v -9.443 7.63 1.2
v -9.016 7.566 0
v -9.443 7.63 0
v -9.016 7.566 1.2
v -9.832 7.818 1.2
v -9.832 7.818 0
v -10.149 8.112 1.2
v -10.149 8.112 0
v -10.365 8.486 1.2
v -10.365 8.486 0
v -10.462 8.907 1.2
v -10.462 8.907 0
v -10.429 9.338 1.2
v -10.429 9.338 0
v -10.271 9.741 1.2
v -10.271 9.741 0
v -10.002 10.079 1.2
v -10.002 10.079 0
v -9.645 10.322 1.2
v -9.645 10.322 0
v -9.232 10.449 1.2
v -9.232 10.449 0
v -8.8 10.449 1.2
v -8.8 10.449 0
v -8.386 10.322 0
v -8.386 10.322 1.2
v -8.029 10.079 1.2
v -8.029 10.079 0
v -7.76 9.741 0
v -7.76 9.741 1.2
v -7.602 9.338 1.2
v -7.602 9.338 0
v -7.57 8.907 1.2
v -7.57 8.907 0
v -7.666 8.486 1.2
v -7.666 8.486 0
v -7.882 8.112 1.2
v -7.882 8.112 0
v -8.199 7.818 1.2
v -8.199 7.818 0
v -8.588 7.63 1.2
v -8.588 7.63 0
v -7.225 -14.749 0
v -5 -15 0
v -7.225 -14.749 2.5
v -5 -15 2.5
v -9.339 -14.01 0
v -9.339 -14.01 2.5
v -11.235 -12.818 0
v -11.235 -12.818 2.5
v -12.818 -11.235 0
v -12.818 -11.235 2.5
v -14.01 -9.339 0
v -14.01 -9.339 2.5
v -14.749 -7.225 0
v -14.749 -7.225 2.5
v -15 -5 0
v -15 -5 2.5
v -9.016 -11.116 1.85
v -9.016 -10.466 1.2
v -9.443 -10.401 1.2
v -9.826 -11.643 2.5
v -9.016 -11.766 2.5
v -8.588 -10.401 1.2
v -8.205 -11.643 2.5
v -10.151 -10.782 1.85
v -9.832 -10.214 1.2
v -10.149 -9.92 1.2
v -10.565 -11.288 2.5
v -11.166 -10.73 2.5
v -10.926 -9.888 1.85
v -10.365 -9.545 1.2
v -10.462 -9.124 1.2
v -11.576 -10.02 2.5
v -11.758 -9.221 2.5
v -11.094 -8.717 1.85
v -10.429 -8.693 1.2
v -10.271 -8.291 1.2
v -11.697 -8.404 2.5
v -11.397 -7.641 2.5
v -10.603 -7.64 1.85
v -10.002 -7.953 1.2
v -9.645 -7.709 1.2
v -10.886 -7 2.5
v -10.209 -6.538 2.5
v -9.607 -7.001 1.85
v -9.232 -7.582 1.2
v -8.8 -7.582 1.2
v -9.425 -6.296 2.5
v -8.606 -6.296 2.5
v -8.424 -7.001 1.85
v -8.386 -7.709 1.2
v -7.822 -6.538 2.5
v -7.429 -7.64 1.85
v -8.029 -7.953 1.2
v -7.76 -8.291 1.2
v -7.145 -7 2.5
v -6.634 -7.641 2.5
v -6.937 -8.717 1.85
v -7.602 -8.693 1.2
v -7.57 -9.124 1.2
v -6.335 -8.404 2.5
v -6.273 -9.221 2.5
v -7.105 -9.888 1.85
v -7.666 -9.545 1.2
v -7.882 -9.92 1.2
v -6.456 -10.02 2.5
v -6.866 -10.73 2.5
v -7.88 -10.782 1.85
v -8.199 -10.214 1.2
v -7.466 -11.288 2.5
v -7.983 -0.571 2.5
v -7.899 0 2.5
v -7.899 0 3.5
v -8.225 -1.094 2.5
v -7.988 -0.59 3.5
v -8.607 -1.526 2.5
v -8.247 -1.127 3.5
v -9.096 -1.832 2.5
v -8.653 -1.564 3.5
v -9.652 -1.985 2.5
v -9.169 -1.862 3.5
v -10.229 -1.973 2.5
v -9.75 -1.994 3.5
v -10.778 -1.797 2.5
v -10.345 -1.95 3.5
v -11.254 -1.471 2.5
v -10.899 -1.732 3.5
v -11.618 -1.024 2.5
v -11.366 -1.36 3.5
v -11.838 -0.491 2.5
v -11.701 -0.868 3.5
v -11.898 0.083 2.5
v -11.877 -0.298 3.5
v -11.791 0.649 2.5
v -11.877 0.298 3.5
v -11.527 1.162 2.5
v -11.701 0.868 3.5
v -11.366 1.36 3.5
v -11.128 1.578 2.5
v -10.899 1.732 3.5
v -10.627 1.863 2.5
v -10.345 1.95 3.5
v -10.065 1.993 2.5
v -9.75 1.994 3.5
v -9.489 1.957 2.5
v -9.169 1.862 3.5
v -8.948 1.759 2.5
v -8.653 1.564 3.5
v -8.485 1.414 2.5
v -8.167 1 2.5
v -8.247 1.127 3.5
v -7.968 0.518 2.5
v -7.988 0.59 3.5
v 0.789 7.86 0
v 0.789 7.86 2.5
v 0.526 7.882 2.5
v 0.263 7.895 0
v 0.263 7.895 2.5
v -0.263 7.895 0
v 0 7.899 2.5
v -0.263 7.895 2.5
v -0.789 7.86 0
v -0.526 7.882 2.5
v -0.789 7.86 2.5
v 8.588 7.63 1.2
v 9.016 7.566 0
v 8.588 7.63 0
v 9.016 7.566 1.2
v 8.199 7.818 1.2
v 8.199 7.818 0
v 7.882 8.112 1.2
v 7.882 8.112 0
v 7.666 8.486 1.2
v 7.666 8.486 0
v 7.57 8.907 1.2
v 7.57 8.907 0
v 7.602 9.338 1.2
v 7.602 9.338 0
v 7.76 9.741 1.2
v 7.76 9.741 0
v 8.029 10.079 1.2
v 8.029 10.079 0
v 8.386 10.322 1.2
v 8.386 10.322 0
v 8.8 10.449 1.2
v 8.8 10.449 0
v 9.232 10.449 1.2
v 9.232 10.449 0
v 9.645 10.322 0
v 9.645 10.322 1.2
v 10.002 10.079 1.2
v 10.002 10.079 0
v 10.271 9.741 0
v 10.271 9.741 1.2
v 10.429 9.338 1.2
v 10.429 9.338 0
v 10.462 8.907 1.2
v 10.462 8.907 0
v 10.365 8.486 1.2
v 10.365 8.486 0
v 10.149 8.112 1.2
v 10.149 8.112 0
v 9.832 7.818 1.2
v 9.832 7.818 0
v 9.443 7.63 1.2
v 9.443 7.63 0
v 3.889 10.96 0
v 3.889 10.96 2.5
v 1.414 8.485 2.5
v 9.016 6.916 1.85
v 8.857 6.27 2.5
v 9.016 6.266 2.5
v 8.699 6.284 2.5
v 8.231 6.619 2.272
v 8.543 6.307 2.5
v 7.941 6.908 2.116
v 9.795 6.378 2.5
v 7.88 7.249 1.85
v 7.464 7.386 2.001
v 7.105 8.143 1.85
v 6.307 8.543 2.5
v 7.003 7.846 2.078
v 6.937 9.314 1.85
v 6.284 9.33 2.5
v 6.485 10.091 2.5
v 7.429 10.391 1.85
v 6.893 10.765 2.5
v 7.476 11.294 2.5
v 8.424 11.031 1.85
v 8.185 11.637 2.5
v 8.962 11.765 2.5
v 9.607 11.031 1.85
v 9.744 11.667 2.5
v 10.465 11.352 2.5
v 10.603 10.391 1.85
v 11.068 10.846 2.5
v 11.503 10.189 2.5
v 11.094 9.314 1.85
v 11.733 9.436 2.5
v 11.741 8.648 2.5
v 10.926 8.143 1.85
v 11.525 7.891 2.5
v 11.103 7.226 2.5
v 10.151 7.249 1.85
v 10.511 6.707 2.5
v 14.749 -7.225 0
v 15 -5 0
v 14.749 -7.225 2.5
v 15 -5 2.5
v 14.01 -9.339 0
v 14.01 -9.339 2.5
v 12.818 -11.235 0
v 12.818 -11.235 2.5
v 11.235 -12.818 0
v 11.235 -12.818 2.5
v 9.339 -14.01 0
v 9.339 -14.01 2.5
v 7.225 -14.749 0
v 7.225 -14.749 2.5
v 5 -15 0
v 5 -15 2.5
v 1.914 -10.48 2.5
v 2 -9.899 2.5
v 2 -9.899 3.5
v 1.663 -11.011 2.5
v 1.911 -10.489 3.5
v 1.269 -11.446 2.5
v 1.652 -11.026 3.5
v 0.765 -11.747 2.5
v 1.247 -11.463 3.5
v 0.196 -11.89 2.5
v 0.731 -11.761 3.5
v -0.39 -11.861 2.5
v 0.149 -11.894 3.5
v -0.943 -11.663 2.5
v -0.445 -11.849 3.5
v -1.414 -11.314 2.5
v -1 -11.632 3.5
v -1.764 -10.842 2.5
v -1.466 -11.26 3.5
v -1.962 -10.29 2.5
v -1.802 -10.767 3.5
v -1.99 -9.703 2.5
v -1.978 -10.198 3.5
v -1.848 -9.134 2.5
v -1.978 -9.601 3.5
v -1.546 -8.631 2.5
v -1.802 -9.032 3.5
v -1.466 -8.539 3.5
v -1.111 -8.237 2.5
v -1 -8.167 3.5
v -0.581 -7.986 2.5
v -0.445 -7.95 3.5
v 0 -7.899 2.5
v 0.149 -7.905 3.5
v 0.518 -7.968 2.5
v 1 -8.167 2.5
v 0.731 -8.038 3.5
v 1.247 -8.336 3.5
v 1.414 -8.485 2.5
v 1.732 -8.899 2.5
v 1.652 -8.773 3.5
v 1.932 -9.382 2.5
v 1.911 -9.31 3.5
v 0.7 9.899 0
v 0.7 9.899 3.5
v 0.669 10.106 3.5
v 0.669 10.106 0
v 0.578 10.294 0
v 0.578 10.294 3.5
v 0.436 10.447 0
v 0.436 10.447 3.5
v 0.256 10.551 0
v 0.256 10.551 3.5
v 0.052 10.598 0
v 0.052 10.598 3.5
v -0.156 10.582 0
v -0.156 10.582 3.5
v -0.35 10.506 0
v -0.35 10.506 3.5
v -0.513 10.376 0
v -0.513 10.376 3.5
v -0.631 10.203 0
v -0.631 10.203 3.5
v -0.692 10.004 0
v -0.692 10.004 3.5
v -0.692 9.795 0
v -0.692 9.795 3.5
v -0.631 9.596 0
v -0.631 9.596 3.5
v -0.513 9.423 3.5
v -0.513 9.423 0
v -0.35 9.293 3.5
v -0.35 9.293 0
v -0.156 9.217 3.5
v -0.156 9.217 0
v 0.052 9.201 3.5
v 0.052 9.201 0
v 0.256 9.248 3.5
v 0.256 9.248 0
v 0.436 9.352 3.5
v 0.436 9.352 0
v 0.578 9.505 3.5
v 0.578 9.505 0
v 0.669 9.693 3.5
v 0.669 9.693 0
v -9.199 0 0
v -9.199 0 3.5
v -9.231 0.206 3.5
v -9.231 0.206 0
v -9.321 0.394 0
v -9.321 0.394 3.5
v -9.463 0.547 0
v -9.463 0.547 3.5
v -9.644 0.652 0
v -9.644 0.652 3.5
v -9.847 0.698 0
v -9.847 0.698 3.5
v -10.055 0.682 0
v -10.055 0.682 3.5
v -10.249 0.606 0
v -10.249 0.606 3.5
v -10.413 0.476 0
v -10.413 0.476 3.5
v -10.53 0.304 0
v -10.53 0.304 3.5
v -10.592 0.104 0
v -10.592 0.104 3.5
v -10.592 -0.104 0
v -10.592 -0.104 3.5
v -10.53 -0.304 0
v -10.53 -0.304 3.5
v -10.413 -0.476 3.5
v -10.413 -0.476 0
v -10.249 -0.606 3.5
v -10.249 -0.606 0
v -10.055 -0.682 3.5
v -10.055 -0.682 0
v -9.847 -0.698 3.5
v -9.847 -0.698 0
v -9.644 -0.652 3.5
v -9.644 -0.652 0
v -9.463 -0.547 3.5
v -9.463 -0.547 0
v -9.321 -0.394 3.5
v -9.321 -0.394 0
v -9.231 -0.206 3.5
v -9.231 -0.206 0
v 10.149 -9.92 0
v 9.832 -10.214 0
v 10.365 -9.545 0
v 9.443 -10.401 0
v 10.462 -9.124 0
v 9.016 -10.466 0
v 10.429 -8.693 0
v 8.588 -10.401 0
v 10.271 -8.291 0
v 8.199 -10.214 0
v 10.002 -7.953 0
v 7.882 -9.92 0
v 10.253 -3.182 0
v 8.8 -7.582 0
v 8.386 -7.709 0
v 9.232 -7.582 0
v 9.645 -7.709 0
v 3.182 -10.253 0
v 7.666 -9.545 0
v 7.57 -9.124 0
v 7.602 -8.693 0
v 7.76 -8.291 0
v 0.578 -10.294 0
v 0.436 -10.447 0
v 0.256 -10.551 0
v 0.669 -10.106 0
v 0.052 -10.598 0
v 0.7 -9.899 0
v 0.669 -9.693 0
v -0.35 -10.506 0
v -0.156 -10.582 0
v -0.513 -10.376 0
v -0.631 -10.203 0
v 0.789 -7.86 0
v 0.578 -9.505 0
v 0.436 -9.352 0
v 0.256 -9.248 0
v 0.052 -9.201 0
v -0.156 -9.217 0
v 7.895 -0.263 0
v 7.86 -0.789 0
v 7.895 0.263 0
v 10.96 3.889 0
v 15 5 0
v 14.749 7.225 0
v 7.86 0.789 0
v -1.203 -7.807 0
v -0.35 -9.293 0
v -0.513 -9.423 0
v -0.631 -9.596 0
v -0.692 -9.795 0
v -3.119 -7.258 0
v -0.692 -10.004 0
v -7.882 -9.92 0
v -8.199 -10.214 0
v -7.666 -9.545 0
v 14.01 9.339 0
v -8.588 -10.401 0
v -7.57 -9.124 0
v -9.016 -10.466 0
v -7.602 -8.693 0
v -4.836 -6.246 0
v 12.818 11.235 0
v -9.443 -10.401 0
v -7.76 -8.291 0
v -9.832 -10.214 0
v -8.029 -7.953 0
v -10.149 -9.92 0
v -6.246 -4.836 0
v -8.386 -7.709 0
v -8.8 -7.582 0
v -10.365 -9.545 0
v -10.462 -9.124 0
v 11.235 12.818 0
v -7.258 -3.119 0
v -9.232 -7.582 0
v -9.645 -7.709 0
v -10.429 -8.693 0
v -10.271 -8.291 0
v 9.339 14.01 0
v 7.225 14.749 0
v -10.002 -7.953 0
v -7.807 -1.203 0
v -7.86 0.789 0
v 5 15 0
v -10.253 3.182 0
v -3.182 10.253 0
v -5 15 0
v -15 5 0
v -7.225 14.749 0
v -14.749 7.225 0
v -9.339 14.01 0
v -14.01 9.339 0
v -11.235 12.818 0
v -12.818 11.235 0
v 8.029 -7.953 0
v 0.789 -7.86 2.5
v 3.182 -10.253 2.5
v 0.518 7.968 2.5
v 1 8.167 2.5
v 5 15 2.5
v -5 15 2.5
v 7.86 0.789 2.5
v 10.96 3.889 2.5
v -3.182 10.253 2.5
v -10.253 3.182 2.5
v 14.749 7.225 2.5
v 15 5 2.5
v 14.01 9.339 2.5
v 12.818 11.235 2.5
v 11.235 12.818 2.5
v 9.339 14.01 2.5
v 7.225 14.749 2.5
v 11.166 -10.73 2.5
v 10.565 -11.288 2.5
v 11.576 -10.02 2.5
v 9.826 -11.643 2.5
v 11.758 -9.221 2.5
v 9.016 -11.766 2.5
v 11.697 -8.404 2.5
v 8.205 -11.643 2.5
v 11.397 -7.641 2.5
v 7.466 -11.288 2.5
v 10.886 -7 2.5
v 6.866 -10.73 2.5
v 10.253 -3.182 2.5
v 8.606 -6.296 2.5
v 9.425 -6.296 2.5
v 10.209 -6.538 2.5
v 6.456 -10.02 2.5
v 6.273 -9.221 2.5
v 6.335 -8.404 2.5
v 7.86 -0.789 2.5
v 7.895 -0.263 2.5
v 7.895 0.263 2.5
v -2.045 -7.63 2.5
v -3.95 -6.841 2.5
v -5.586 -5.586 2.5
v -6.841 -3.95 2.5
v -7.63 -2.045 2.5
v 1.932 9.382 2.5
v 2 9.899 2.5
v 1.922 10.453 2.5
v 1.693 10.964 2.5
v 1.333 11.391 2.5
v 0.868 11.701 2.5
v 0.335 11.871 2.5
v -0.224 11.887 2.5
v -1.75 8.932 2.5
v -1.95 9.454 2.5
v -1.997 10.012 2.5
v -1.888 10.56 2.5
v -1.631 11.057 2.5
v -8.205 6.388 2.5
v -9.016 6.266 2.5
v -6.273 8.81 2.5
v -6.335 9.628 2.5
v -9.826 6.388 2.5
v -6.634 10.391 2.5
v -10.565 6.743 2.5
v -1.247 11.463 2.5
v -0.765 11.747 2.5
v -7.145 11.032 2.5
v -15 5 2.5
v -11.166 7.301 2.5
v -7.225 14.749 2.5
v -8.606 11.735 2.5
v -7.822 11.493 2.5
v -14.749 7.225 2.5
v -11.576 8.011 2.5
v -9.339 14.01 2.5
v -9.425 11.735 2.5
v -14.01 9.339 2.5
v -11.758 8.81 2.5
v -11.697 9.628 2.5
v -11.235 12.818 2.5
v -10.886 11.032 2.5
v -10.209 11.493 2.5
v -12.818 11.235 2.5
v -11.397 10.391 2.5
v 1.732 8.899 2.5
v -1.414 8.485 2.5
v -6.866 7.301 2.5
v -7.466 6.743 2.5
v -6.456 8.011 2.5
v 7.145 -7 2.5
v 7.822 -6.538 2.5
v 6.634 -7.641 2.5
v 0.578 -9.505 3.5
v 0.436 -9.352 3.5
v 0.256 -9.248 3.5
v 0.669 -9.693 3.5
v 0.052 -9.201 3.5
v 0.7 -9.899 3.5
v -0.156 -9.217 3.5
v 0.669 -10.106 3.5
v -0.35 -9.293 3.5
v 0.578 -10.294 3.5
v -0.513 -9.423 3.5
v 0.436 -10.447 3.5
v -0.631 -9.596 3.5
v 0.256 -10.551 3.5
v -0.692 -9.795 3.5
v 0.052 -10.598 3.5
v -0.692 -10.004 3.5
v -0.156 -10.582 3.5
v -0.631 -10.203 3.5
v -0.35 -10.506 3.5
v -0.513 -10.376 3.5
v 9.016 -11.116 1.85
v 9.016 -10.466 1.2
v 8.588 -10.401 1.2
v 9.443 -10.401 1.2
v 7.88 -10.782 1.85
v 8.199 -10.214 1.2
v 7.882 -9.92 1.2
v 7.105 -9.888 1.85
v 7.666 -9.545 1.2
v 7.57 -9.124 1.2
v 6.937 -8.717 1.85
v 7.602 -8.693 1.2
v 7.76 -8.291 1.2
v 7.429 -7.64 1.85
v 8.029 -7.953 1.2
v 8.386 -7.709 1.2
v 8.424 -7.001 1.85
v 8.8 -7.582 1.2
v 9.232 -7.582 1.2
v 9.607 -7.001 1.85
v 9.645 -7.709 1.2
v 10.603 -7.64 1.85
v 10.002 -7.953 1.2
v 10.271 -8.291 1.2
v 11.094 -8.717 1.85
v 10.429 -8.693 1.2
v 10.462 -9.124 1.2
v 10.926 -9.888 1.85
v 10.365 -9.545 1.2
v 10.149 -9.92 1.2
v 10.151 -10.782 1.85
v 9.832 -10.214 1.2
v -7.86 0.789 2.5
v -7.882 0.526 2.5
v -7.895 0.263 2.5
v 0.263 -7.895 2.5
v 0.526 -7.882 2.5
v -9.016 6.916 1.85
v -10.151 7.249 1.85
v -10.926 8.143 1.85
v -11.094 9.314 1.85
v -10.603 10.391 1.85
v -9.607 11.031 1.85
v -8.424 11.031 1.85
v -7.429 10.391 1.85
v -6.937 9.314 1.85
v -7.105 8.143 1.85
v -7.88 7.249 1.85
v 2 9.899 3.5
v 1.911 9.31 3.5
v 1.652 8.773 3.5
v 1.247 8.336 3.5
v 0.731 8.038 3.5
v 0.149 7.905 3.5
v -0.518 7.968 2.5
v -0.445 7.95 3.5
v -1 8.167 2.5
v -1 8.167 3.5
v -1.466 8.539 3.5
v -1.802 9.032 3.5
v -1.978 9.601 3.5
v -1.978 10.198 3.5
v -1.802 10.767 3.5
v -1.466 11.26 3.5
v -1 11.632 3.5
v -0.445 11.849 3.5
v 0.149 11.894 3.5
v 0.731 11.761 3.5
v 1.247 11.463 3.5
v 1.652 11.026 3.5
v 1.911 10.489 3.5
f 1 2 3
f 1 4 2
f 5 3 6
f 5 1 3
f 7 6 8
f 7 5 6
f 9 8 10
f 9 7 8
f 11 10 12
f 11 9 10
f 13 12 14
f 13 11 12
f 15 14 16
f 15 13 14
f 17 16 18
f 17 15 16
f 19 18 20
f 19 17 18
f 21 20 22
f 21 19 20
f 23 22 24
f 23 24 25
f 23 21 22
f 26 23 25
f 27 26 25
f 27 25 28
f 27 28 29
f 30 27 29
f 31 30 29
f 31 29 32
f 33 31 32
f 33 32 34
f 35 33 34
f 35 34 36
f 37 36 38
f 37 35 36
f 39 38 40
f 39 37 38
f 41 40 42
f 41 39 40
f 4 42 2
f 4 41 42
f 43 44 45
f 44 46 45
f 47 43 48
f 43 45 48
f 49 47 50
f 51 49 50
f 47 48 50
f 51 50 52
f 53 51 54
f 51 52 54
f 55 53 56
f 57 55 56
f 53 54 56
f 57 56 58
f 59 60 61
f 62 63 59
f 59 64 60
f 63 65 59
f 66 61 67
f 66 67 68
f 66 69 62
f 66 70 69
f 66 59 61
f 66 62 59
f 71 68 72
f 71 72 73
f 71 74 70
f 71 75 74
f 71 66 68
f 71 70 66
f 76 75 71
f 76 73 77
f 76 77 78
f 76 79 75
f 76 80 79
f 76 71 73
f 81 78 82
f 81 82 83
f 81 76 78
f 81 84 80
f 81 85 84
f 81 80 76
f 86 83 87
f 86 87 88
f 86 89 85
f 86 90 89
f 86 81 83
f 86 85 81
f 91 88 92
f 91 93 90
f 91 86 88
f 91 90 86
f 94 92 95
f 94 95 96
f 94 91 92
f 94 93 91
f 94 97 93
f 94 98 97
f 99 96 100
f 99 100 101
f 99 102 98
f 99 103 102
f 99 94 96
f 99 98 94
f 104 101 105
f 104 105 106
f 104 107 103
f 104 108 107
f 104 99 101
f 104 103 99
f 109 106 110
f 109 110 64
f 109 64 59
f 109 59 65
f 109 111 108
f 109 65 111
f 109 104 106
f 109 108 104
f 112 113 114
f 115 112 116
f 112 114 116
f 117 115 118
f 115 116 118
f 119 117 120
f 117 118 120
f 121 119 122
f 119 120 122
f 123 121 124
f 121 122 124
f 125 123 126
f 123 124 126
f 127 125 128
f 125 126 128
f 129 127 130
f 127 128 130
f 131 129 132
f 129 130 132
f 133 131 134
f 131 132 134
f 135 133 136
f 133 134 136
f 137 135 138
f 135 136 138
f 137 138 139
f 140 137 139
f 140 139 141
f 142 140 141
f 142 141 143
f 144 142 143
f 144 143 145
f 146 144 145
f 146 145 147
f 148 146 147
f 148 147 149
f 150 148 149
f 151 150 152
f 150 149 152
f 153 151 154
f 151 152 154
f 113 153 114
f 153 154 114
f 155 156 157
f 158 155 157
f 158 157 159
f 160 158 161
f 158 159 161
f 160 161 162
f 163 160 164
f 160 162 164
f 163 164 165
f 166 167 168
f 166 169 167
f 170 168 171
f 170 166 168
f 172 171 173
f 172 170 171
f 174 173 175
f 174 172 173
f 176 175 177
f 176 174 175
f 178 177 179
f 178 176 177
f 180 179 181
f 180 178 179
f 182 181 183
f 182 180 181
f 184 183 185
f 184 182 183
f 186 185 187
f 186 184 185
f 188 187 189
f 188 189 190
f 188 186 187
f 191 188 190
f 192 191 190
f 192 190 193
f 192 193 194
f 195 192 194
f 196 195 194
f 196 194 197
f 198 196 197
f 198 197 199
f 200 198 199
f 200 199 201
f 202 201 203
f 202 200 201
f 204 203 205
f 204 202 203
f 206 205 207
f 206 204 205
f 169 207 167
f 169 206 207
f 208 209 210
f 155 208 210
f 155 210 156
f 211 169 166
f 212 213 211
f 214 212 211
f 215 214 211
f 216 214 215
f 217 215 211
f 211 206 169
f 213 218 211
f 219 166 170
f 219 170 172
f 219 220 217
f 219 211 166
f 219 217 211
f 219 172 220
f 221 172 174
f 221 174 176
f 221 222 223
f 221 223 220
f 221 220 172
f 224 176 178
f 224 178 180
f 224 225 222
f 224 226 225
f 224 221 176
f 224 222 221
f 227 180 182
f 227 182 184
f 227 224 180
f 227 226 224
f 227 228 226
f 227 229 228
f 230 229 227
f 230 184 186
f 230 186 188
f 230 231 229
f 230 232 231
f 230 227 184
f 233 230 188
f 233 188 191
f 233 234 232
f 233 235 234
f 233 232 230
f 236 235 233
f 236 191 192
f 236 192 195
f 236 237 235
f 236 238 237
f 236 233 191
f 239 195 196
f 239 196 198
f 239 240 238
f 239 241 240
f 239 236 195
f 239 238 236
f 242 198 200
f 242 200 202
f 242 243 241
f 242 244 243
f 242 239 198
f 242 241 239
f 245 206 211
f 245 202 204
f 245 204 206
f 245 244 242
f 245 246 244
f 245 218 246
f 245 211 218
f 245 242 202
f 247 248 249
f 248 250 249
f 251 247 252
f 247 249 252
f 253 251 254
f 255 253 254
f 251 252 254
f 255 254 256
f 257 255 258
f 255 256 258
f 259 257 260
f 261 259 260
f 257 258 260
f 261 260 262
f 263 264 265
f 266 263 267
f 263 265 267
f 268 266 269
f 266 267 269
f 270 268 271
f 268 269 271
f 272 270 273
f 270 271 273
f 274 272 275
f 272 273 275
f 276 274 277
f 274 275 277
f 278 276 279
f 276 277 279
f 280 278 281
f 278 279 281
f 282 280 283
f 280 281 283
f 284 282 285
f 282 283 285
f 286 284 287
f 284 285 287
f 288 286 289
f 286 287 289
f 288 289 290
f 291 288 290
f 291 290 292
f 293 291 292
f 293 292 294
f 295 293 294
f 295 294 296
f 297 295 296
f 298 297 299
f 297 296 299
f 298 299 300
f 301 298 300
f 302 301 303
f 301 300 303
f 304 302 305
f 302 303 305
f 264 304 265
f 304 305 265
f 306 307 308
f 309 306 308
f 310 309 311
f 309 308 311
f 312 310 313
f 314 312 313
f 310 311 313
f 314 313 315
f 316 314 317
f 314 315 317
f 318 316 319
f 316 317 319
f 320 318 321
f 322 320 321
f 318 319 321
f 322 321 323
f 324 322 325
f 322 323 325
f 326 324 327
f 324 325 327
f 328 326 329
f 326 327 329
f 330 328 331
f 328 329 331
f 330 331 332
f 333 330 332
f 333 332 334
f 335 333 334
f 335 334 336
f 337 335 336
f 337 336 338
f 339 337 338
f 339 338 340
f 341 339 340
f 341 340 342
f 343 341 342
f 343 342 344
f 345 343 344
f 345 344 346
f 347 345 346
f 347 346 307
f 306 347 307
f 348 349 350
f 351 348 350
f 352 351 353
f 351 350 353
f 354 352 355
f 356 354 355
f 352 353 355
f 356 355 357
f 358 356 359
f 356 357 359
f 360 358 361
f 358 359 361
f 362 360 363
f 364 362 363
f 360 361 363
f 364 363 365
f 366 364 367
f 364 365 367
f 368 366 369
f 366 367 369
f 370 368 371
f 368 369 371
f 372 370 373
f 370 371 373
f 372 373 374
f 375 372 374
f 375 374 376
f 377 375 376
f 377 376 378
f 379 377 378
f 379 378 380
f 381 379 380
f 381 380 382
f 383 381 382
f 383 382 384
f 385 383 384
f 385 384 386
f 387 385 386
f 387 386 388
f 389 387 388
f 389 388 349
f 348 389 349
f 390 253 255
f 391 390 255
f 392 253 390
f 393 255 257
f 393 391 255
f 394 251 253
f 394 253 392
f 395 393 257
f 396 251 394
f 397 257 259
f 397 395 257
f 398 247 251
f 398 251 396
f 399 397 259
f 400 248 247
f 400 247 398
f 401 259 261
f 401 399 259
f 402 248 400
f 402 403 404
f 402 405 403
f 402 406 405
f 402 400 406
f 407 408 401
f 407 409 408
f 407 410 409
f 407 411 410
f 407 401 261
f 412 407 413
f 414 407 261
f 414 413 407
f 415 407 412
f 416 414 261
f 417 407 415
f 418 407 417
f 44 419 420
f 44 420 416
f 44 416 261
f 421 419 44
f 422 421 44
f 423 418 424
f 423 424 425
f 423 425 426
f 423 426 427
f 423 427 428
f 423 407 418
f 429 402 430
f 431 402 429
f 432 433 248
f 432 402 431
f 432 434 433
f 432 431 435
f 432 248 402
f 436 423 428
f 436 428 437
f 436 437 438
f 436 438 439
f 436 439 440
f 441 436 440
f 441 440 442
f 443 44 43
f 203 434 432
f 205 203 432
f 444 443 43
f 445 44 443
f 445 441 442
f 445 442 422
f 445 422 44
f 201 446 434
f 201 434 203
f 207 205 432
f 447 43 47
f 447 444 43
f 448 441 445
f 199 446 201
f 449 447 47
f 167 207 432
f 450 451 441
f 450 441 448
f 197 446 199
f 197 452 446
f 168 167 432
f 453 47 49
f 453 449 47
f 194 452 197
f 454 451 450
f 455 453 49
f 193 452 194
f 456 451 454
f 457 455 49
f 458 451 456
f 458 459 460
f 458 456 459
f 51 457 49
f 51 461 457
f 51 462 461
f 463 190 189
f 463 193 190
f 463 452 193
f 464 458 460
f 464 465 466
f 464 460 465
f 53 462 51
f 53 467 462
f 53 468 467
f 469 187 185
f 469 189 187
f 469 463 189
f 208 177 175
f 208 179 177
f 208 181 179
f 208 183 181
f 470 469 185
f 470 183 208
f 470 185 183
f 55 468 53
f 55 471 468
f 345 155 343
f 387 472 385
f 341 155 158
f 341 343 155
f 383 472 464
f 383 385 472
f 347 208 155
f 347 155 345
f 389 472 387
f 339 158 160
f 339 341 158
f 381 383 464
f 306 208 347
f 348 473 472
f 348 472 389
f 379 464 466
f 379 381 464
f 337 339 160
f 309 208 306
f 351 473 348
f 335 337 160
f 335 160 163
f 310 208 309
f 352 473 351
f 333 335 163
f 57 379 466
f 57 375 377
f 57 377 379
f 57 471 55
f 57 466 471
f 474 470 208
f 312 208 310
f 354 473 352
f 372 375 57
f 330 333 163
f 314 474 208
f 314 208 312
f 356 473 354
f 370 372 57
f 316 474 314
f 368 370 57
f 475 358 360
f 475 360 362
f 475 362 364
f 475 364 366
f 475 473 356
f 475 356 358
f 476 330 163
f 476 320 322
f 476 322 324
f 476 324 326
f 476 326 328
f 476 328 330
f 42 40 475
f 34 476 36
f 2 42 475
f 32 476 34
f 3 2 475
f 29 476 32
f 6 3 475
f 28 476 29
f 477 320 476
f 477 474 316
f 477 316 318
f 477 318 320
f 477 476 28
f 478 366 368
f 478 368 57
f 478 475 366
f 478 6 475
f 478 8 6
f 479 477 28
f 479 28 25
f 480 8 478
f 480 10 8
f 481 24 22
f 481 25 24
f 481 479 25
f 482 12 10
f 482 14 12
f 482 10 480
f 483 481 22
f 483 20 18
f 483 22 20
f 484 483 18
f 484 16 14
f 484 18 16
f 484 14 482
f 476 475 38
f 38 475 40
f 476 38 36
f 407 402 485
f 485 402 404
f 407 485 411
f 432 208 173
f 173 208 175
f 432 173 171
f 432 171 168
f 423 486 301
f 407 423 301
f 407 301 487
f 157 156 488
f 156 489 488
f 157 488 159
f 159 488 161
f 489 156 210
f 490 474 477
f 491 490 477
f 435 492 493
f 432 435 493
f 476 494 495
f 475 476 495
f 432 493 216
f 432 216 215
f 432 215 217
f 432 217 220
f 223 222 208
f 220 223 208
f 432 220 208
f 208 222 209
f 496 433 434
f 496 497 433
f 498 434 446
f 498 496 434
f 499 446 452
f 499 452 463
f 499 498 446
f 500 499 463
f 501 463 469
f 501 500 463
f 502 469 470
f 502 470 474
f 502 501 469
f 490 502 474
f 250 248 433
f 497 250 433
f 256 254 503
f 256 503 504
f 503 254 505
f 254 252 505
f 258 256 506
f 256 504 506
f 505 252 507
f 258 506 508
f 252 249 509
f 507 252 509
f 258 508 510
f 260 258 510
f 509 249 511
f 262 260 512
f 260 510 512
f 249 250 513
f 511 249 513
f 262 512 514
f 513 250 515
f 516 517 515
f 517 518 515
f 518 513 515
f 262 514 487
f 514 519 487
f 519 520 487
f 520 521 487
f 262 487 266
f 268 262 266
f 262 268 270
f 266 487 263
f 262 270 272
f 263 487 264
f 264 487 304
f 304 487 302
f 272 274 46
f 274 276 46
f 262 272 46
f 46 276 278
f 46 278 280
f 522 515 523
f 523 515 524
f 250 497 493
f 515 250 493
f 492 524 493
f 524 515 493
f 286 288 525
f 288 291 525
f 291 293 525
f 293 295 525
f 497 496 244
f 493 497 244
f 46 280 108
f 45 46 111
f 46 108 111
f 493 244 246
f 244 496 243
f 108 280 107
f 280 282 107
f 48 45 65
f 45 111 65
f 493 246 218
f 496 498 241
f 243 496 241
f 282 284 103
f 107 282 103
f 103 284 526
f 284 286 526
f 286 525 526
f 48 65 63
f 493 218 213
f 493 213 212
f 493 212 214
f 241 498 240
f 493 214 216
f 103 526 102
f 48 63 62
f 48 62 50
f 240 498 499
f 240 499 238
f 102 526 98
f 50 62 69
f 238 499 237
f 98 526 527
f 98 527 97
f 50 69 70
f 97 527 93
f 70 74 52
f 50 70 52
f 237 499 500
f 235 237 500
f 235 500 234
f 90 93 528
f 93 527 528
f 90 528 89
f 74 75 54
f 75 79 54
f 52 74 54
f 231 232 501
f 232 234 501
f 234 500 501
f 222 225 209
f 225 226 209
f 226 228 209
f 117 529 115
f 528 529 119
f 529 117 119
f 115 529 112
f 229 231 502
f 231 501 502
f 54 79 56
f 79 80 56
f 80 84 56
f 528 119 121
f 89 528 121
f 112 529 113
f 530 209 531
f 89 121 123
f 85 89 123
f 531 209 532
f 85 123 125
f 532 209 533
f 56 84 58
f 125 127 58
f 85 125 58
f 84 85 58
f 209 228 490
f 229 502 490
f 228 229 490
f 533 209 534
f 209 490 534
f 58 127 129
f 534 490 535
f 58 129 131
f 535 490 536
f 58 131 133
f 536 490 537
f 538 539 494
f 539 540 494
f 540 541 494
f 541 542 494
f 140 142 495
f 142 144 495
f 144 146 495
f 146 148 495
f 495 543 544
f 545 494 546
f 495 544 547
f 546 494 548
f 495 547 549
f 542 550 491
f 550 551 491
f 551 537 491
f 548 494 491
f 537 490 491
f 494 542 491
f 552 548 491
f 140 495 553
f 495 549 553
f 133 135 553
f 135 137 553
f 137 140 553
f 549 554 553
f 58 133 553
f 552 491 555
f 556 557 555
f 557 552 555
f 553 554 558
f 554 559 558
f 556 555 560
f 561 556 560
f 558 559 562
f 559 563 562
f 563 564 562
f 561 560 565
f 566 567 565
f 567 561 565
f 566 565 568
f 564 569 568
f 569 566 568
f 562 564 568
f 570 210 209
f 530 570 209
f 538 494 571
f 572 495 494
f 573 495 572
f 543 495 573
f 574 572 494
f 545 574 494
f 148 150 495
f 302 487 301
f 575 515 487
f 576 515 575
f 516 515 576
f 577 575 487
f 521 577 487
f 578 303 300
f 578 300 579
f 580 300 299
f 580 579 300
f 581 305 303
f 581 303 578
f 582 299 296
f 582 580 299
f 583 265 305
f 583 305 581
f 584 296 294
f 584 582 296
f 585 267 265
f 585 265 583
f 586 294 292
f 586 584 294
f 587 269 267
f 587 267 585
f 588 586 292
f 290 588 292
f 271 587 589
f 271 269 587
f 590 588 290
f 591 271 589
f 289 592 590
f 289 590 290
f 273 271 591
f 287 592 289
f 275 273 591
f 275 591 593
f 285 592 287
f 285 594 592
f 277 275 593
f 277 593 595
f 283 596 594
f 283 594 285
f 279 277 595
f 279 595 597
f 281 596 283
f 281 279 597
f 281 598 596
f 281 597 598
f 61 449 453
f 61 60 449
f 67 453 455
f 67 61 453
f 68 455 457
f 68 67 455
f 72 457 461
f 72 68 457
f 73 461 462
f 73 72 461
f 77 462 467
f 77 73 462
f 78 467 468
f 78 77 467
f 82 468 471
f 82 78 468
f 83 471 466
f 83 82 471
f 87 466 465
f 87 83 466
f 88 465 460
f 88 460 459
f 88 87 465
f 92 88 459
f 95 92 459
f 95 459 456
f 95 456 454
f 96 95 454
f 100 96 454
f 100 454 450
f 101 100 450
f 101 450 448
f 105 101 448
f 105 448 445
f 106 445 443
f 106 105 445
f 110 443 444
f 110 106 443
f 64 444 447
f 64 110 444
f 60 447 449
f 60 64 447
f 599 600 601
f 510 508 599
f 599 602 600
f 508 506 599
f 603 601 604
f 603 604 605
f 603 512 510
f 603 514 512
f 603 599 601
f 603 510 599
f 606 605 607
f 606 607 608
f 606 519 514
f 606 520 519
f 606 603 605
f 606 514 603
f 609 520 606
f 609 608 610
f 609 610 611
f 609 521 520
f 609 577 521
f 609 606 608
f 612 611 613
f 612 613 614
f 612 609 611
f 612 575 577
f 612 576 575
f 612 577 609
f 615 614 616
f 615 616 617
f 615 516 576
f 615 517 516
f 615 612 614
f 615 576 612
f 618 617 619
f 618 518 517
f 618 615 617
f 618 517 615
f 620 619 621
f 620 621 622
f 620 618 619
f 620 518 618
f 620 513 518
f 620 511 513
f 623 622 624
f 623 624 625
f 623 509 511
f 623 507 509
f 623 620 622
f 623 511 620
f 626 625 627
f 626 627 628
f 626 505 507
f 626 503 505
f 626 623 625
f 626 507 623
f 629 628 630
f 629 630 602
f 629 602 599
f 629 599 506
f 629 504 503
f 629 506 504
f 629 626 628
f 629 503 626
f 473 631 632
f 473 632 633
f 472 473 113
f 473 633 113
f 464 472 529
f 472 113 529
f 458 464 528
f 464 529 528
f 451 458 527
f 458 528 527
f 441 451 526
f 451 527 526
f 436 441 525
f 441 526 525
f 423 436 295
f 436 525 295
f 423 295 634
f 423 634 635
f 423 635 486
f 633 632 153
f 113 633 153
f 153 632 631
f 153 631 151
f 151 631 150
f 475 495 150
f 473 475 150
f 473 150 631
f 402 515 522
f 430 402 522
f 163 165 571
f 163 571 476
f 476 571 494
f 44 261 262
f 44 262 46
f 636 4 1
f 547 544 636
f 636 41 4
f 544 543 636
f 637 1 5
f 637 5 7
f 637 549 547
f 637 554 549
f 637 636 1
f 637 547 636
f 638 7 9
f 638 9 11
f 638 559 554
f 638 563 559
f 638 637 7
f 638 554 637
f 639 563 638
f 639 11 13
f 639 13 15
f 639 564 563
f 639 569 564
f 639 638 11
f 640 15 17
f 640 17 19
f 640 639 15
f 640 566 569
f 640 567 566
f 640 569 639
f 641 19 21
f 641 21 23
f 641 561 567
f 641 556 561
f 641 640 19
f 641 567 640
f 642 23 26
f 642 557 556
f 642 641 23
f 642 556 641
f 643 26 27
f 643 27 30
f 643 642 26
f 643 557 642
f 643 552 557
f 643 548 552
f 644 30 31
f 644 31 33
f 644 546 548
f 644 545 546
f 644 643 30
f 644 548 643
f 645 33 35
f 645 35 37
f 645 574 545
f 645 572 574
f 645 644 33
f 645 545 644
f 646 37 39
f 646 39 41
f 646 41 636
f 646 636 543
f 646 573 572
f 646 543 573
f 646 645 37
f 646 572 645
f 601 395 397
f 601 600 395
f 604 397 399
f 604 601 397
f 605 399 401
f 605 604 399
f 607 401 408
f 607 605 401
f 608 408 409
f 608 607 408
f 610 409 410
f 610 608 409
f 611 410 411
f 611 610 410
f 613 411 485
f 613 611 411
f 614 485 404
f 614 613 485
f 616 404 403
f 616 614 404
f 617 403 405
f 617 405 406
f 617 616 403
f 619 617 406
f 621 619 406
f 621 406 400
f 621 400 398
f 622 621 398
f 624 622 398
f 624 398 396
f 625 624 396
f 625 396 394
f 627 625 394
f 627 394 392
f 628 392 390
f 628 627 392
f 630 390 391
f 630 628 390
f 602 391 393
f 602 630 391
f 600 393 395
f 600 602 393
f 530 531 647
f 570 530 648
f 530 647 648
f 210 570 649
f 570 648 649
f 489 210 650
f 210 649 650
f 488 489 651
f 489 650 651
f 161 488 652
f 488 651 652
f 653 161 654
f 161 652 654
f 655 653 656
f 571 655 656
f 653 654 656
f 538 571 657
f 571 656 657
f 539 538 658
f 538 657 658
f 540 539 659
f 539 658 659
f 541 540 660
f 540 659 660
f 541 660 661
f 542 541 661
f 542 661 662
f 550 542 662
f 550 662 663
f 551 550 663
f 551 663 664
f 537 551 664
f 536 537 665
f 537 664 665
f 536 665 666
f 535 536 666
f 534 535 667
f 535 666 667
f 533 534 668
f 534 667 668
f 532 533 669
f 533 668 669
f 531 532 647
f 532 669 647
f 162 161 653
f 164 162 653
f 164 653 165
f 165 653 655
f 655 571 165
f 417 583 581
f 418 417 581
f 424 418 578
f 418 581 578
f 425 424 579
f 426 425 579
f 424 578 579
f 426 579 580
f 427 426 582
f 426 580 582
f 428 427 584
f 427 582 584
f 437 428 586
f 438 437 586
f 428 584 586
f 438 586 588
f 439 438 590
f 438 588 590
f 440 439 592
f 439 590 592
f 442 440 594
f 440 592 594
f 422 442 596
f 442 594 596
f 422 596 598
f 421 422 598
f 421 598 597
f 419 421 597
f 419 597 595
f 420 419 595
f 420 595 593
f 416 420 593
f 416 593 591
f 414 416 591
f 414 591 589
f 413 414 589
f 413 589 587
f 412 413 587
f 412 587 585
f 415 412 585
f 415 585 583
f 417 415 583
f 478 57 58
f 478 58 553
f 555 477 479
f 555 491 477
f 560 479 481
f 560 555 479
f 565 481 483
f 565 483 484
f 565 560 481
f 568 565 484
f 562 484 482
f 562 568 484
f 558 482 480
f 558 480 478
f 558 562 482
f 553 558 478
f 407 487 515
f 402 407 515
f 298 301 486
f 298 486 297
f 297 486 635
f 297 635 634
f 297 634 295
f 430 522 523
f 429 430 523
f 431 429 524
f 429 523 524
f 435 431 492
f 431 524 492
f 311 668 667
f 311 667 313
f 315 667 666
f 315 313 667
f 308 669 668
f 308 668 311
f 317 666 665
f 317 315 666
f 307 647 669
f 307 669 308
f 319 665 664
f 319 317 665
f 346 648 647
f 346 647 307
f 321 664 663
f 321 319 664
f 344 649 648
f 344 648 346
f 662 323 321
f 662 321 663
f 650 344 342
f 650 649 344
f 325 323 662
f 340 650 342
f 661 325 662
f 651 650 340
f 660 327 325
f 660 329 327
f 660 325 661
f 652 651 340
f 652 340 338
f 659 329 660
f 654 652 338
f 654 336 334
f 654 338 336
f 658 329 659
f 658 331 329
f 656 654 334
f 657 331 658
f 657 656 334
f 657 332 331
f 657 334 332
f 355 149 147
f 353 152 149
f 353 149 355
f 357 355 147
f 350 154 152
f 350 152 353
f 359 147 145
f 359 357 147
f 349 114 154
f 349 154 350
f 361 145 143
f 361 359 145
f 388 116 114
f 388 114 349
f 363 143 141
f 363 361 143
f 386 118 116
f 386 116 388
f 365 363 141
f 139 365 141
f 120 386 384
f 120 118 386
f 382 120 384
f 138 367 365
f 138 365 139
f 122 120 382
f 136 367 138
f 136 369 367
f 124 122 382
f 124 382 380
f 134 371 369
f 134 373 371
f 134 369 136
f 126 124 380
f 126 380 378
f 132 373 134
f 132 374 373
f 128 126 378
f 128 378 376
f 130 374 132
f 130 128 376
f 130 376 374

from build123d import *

# Parameters (mm, degrees)
SKETCH1_W                                      = 30
SKETCH1_H                                      = 30
BOSS_EXTRUDE1_DEPTH                            = 2.5
CUT_EXTRUDE1_DEPTH                             = 3.5
SKETCH3_W                                      = 2
SKETCH3_H                                      = 1
SKETCH4_W                                      = 2
SKETCH4_H                                      = 1
SKETCH5_W                                      = 2
SKETCH5_H                                      = 1
CSK_FOR_M2_5_FLAT_HEAD_MACHINE_SCREW1_AT_COUNT = 2
CSK_FOR_M2_5_FLAT_HEAD_MACHINE_SCREW1_AT_PITCH = 18.03122292
CSK_FOR_M2_5_FLAT_HEAD_MACHINE_SCREW_2_COUNT   = 2
CSK_FOR_M2_5_FLAT_HEAD_MACHINE_SCREW_2_PITCH   = 25.5
CSK_FOR_M2_5_FLAT_HEAD_MACHINE_SCREW_3_COUNT   = 2
CSK_FOR_M2_5_FLAT_HEAD_MACHINE_SCREW_3_PITCH   = 18.03122292
F_1_4_1_4_DIAMETER_HOLE1_D                     = 1.4
F_1_4_1_4_DIAMETER_HOLE1_DEPTH                 = 3.5
FILLET1_R                                      = 10


with BuildPart() as part:
    # Sketch1 → Boss-Extrude1 (new body)
    with BuildSketch(Plane(origin=(0, 0, 0), x_dir=(-1, 0, 0), z_dir=(0, 0, -1))):
        Rectangle(SKETCH1_W, SKETCH1_H)
    extrude(amount=-BOSS_EXTRUDE1_DEPTH)

    # Sketch2 → Cut-Extrude1 (cut, through all)
    with BuildSketch(Plane.XY.offset(2.5)):
        with BuildLine():
            Line((-3.181980515, 10.253048327), (-10.253048327, 3.181980515))
            Line((-10.253048327, 3.181980515), (-7.860000362, 0.78893255))
            ThreePointArc((-7.860000362, 0.78893255), (-5.585786438, -5.585786438), (0.78893255, -7.860000362))
            Line((0.78893255, -7.860000362), (3.181980515, -10.253048327))
            Line((3.181980515, -10.253048327), (10.253048327, -3.181980515))
            Line((10.253048327, -3.181980515), (7.860000362, -0.78893255))
            ThreePointArc((7.860000362, -0.78893255), (7.899494937, 0), (7.860000362, 0.78893255))
            Line((7.860000362, 0.78893255), (10.960155108, 3.889087297))
            Line((10.960155108, 3.889087297), (3.889087297, 10.960155108))
            Line((3.889087297, 10.960155108), (0.78893255, 7.860000362))
            ThreePointArc((0.78893255, 7.860000362), (0, 7.899494937), (-0.78893255, 7.860000362))
            Line((-0.78893255, 7.860000362), (-3.181980515, 10.253048327))
        make_face()
    extrude(amount=-CUT_EXTRUDE1_DEPTH, mode=Mode.SUBTRACT)

    # Sketch3 → Revolve1 (revolve)
    with BuildSketch(Plane.XZ):
        with Locations((-8.899494937, 3)):
            Rectangle(SKETCH3_W, SKETCH3_H)
    revolve(axis=Axis((-9.899494937, 0, 3.5), (0, 0, -1)))

    # Sketch4 → Revolve2 (revolve)
    with BuildSketch(Plane.XZ.offset(-9.899494937)):
        with Locations((1, 3)):
            Rectangle(SKETCH4_W, SKETCH4_H)
    revolve(axis=Axis((0, 9.899494937, 3.5), (0, 0, -1)))

    # Sketch5 → Revolve3 (revolve)
    with BuildSketch(Plane.XZ.offset(9.899494937)):
        with Locations((1, 3)):
            Rectangle(SKETCH5_W, SKETCH5_H)
    revolve(axis=Axis((0, -9.899494937, 3.5), (0, 0, -1)))

    # Sketch6 → CSK for M2.5 Flat Head Machine Screw1 (revolve, cut)
    with BuildSketch(Plane(origin=(9.01561146, 9.01561146, 2.5), x_dir=(0, -1, 0), z_dir=(1, 0, 0))):
        Polygon((0, 0), (0, 2.5), (1.45, 2.5), (1.45, 1.3), (2.75, 0), align=None)
    csk_for_m2_5_flat_head_machine_screw1 = revolve(axis=Axis((9.01561146, 9.01561146, 8.85), (0, 0, -1)), mode=Mode.SUBTRACT)

    # CSK for M2.5 Flat Head Machine Screw1 at: CSK for M2.5 Flat Head Machine Screw1 ×2
    with Locations(*[(-i * CSK_FOR_M2_5_FLAT_HEAD_MACHINE_SCREW1_AT_PITCH, 0, 0) for i in range(1, CSK_FOR_M2_5_FLAT_HEAD_MACHINE_SCREW1_AT_COUNT)]):
        add(csk_for_m2_5_flat_head_machine_screw1, mode=Mode.SUBTRACT)

    # CSK for M2.5 Flat Head Machine Screw 2: CSK for M2.5 Flat Head Machine Screw1 ×2
    with Locations(*[Vector(-0.707106781, -0.707106781, 0) * (i * CSK_FOR_M2_5_FLAT_HEAD_MACHINE_SCREW_2_PITCH) for i in range(1, CSK_FOR_M2_5_FLAT_HEAD_MACHINE_SCREW_2_COUNT)]):
        add(csk_for_m2_5_flat_head_machine_screw1, mode=Mode.SUBTRACT)

    # CSK for M2.5 Flat Head Machine Screw 3: CSK for M2.5 Flat Head Machine Screw1 ×2
    with Locations(*[(0, -i * CSK_FOR_M2_5_FLAT_HEAD_MACHINE_SCREW_3_PITCH, 0) for i in range(1, CSK_FOR_M2_5_FLAT_HEAD_MACHINE_SCREW_3_COUNT)]):
        add(csk_for_m2_5_flat_head_machine_screw1, mode=Mode.SUBTRACT)

    # Ø1.4 (1.4) Diameter Hole1
    with Locations(Plane(origin=(0, 0, 0), x_dir=(-1, 0, 0), z_dir=(0, 0, -1))):
        with Locations((9.899494937, 0), (0, -9.899494937), (0, 9.899494937)):
            Hole(F_1_4_1_4_DIAMETER_HOLE1_D / 2, depth=F_1_4_1_4_DIAMETER_HOLE1_DEPTH)

    # Fillet1
    fillet1_edges = [part.edges().sort_by_distance(p)[0] for p in [
        (15, -15, 1.25),
        (15, 15, 1.25),
        (-15, 15, 1.25),
        (-15, -15, 1.25),
    ]]
    fillet(fillet1_edges, radius=FILLET1_R)


solid = part.part
